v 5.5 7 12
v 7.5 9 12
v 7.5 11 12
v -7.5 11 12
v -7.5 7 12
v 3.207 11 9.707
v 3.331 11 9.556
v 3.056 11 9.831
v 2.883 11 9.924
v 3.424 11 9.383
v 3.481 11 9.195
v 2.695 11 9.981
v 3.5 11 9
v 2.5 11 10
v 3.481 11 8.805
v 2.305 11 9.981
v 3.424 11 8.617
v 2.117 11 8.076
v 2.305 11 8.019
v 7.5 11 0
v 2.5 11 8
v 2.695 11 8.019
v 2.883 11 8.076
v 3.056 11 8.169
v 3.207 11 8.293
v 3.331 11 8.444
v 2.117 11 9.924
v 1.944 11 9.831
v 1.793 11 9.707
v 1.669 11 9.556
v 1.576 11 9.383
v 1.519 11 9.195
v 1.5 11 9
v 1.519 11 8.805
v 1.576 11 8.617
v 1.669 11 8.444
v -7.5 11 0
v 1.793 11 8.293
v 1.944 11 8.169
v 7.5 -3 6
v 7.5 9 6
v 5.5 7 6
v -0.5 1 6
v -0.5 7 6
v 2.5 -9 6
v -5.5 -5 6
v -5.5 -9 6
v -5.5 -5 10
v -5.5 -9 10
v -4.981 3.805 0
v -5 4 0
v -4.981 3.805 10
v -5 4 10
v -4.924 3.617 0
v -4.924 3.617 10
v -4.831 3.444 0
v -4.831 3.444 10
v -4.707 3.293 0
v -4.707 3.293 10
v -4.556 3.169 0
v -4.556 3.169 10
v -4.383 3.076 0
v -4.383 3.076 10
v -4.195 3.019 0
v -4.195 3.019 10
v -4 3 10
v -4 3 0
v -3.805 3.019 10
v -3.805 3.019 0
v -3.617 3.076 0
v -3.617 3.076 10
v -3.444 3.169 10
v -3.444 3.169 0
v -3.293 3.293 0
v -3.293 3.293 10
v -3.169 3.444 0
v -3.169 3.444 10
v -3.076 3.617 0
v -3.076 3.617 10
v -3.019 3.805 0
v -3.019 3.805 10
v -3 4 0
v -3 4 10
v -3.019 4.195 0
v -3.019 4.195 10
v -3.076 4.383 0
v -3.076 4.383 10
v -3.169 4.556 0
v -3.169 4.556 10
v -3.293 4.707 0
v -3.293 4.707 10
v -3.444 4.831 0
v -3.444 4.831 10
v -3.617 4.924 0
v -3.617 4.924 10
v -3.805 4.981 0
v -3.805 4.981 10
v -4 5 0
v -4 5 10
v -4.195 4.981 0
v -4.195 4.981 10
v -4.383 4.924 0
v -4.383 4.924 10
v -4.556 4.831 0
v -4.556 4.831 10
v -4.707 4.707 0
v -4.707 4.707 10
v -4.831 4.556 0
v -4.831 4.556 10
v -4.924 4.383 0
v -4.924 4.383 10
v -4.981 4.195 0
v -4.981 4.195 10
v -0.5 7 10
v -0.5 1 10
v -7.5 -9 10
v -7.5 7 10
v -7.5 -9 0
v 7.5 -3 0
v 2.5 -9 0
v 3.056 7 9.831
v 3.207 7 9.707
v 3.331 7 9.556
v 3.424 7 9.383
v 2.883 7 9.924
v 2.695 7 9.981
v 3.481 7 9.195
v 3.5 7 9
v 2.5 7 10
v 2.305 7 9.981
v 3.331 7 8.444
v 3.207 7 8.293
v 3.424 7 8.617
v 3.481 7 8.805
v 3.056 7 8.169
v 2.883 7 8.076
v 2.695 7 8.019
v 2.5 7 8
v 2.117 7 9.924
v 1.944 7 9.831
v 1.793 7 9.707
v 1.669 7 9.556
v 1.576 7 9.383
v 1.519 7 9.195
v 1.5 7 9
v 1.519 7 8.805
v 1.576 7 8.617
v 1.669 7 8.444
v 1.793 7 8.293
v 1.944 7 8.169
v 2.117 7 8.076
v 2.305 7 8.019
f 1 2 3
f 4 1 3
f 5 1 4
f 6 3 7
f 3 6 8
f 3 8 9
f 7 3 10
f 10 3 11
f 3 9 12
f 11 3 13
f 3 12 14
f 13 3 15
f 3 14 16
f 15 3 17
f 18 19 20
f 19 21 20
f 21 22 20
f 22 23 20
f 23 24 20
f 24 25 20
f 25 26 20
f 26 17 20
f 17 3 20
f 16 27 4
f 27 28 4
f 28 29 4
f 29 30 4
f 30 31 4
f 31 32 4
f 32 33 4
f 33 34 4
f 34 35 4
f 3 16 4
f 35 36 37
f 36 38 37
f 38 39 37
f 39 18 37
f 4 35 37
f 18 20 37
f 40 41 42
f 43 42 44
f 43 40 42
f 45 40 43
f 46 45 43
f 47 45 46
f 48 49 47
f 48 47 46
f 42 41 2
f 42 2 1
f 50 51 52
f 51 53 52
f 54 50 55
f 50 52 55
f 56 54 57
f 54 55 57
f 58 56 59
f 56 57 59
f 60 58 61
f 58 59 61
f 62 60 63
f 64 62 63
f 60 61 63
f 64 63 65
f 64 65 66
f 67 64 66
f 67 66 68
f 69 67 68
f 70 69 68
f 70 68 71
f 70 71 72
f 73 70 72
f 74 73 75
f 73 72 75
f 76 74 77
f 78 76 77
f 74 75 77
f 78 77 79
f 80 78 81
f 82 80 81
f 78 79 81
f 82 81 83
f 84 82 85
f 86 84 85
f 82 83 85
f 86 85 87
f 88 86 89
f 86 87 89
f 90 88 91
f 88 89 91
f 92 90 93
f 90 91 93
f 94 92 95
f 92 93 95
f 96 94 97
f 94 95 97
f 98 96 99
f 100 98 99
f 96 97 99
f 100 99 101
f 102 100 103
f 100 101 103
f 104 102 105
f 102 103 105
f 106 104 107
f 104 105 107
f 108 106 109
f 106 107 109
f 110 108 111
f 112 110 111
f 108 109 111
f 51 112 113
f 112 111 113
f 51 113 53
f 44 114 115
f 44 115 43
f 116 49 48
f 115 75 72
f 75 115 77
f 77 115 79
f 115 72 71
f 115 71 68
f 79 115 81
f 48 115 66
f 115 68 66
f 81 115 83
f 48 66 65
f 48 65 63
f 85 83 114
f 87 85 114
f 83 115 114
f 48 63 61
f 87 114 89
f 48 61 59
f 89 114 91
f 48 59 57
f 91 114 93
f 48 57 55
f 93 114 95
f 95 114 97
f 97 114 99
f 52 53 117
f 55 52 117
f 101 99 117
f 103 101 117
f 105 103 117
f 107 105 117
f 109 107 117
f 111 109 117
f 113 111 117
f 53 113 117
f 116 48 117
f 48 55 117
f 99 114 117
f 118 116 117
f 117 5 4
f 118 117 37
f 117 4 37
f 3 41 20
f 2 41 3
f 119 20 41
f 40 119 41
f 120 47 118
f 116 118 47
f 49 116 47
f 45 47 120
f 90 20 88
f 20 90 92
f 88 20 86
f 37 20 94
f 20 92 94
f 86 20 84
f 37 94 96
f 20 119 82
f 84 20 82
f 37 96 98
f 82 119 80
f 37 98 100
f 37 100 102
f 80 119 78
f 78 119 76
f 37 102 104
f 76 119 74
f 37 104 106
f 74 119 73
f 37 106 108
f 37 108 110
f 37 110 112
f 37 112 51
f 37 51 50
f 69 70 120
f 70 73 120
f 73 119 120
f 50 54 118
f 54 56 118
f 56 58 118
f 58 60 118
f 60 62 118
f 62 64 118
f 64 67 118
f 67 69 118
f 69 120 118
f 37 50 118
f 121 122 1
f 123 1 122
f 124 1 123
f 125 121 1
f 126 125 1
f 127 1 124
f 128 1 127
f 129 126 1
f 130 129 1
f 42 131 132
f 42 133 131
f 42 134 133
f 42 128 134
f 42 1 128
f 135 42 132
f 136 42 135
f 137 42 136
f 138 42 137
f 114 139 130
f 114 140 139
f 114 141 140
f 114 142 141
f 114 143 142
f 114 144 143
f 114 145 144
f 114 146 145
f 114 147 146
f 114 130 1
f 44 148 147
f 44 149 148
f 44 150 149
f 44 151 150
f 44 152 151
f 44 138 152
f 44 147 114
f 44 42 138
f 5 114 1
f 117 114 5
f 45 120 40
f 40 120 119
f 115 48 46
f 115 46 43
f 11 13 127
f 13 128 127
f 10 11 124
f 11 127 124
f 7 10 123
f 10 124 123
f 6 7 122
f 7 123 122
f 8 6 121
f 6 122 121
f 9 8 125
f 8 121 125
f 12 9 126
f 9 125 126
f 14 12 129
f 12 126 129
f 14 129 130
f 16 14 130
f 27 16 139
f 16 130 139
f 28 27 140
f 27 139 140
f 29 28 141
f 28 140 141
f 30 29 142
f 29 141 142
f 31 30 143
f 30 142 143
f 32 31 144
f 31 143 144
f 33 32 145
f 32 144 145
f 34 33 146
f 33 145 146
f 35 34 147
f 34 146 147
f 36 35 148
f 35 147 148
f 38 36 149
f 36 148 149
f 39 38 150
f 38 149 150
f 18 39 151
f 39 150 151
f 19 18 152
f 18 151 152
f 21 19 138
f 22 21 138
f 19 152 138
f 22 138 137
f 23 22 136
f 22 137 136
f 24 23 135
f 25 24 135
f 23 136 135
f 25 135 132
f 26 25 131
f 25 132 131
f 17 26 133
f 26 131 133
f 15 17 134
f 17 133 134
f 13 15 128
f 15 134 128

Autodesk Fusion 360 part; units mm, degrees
sketch "Sketch1" plane through (0, 0, 0) normal (0, 0, 1) x (1, 0, 0)
  line L0 (7.5, 9) -> (-7.5, 9)
  line L1 (-7.5, 9) -> (-7.5, -9)
  line L2 (-7.5, -9) -> (2.5, -9)
  line L3 (7.5, -3) -> (7.5, 7)
  line L4 (2.5, -9) -> (7.5, -3)
  line L5 (5.5, 7) -> (7.5, 9)
  line L6 (7.5, 7) -> (7.5, 9)
  line L7 (5.5, 7) -> (-7.5, 7)
  dimension "d2" = 18
  dimension "d3" = 10
  dimension "d4" = 2
  dimension "d5" = 2
extrude "Extrude1" add sketch "Sketch1" along normal blind 6 contours L1 L2 L3 L4 L5 L6 L7
sketch "Sketch2" plane through (0, 0, 6) normal (0, 0, 1) x (-1, 0, 0)
  line L0 (-5.5, -7) -> (7.5, -7)
  line L1 (7.5, -7) -> (7.5, 9)
  line L2 (7.5, 9) -> (-2.5, 9)
  line L3 (-2.5, 9) -> (-7.5, 3)
  line L4 (-7.5, 3) -> (-7.5, -9)
  line L5 (-7.5, -9) -> (-5.5, -7)
  line L6 (-7.5, -9) -> (7.5, -9)
  line L7 (7.5, -9) -> (7.5, -7)
  dimension "d8" = 15
extrude "Extrude2" add sketch "Sketch2" along normal blind 6 and the other way blind 6 contours L0 L5 L6 L7
extrude "Extrude3" add 1 faces at (-2.5, 9, 6) along direction (0, 1, 0) blind 2
sketch "Sketch3" plane through (0, 7, 0) normal (0, -1, 0) x (1, 0, 0)
  line L0 (-7.5, 6) -> (5.5, 6)
  line L1 (5.5, 6) -> (5.5, 12)
  line L2 (5.5, 12) -> (-7.5, 12)
  line L3 (-7.5, 12) -> (-7.5, 6)
  line L4 (5.5, 12) -> (5.5, 10) construction
  line L5 (5.5, 10) -> (-0.5, 10) construction
  line L6 (-0.5, 10) -> (-7.5, 10)
  line L7 (-0.5, 10) -> (-0.5, 6)
extrude "Extrude4" add sketch "Sketch3" along normal blind 16 contours L0 L3 L6 L7
sketch "Sketch4" plane through (0, 0, 10) normal (0, 0, 1) x (-1, 0, 0)
  line L0 (0.5, -7) -> (7.5, -7)
  line L1 (7.5, -7) -> (7.5, 9)
  line L2 (7.5, 9) -> (0.5, 9)
  line L3 (0.5, 9) -> (0.5, -7)
  line L4 (7.5, 9) -> (5.5, 9)
  line L5 (5.5, 9) -> (5.5, 5)
  line L6 (0.5, -7) -> (0.5, -1)
  line L7 (5.5, 5) -> (0.5, -1)
  dimension "d17" = 2
  dimension "d18" = 6
extrude "Extrude5" cut sketch "Sketch4" against normal blind 4 contours L2 L3 L5 L7
sketch "Sketch5" plane through (0, 0, 10) normal (0, 0, 1) x (-1, 0, 0)
  line L0 (5.5, 9) -> (5.5, 5)
  line L1 (5.5, 5) -> (0.5, -1)
  line L2 (0.5, -1) -> (0.5, -7)
  line L3 (0.5, -7) -> (7.5, -7)
  line L4 (7.5, -7) -> (7.5, 9)
  line L5 (7.5, 9) -> (5.5, 9)
  line L6 (0.5, -1) -> (7.5, -1) construction
  circle A0 centre (4, -4) radius 1
  dimension "d21" = 2
extrude "Extrude6" cut sketch "Sketch5" against normal blind 6 contours A0
sketch "Sketch6" plane through (0, 7, 0) normal (0, -1, 0) x (1, 0, 0)
  line L0 (-0.5, 10) -> (-0.5, 6)
  line L1 (-0.5, 6) -> (5.5, 6)
  line L2 (5.5, 6) -> (5.5, 12)
  line L3 (5.5, 12) -> (-7.5, 12)
  line L4 (-7.5, 12) -> (-7.5, 10)
  line L5 (-7.5, 10) -> (-0.5, 10)
  line L6 (-0.5, 12) -> (-0.5, 11.8671) construction
  line L7 (-0.5, 11.8671) -> (-0.5, 10) construction
  circle A0 centre (2.5, 9) radius 1
  dimension "d24" = 2
extrude "Extrude7" cut sketch "Sketch6" against normal blind 3.5 contours A0
extrude "Extrude8" cut 1 faces at (2.6218, 10.5, 8.6897) along direction (0, 1, 0) blind 6
extrude "Extrude9" cut 1 faces at (-4.4091, 4.2521, 4) along direction (0, 0, -1) blind 58
